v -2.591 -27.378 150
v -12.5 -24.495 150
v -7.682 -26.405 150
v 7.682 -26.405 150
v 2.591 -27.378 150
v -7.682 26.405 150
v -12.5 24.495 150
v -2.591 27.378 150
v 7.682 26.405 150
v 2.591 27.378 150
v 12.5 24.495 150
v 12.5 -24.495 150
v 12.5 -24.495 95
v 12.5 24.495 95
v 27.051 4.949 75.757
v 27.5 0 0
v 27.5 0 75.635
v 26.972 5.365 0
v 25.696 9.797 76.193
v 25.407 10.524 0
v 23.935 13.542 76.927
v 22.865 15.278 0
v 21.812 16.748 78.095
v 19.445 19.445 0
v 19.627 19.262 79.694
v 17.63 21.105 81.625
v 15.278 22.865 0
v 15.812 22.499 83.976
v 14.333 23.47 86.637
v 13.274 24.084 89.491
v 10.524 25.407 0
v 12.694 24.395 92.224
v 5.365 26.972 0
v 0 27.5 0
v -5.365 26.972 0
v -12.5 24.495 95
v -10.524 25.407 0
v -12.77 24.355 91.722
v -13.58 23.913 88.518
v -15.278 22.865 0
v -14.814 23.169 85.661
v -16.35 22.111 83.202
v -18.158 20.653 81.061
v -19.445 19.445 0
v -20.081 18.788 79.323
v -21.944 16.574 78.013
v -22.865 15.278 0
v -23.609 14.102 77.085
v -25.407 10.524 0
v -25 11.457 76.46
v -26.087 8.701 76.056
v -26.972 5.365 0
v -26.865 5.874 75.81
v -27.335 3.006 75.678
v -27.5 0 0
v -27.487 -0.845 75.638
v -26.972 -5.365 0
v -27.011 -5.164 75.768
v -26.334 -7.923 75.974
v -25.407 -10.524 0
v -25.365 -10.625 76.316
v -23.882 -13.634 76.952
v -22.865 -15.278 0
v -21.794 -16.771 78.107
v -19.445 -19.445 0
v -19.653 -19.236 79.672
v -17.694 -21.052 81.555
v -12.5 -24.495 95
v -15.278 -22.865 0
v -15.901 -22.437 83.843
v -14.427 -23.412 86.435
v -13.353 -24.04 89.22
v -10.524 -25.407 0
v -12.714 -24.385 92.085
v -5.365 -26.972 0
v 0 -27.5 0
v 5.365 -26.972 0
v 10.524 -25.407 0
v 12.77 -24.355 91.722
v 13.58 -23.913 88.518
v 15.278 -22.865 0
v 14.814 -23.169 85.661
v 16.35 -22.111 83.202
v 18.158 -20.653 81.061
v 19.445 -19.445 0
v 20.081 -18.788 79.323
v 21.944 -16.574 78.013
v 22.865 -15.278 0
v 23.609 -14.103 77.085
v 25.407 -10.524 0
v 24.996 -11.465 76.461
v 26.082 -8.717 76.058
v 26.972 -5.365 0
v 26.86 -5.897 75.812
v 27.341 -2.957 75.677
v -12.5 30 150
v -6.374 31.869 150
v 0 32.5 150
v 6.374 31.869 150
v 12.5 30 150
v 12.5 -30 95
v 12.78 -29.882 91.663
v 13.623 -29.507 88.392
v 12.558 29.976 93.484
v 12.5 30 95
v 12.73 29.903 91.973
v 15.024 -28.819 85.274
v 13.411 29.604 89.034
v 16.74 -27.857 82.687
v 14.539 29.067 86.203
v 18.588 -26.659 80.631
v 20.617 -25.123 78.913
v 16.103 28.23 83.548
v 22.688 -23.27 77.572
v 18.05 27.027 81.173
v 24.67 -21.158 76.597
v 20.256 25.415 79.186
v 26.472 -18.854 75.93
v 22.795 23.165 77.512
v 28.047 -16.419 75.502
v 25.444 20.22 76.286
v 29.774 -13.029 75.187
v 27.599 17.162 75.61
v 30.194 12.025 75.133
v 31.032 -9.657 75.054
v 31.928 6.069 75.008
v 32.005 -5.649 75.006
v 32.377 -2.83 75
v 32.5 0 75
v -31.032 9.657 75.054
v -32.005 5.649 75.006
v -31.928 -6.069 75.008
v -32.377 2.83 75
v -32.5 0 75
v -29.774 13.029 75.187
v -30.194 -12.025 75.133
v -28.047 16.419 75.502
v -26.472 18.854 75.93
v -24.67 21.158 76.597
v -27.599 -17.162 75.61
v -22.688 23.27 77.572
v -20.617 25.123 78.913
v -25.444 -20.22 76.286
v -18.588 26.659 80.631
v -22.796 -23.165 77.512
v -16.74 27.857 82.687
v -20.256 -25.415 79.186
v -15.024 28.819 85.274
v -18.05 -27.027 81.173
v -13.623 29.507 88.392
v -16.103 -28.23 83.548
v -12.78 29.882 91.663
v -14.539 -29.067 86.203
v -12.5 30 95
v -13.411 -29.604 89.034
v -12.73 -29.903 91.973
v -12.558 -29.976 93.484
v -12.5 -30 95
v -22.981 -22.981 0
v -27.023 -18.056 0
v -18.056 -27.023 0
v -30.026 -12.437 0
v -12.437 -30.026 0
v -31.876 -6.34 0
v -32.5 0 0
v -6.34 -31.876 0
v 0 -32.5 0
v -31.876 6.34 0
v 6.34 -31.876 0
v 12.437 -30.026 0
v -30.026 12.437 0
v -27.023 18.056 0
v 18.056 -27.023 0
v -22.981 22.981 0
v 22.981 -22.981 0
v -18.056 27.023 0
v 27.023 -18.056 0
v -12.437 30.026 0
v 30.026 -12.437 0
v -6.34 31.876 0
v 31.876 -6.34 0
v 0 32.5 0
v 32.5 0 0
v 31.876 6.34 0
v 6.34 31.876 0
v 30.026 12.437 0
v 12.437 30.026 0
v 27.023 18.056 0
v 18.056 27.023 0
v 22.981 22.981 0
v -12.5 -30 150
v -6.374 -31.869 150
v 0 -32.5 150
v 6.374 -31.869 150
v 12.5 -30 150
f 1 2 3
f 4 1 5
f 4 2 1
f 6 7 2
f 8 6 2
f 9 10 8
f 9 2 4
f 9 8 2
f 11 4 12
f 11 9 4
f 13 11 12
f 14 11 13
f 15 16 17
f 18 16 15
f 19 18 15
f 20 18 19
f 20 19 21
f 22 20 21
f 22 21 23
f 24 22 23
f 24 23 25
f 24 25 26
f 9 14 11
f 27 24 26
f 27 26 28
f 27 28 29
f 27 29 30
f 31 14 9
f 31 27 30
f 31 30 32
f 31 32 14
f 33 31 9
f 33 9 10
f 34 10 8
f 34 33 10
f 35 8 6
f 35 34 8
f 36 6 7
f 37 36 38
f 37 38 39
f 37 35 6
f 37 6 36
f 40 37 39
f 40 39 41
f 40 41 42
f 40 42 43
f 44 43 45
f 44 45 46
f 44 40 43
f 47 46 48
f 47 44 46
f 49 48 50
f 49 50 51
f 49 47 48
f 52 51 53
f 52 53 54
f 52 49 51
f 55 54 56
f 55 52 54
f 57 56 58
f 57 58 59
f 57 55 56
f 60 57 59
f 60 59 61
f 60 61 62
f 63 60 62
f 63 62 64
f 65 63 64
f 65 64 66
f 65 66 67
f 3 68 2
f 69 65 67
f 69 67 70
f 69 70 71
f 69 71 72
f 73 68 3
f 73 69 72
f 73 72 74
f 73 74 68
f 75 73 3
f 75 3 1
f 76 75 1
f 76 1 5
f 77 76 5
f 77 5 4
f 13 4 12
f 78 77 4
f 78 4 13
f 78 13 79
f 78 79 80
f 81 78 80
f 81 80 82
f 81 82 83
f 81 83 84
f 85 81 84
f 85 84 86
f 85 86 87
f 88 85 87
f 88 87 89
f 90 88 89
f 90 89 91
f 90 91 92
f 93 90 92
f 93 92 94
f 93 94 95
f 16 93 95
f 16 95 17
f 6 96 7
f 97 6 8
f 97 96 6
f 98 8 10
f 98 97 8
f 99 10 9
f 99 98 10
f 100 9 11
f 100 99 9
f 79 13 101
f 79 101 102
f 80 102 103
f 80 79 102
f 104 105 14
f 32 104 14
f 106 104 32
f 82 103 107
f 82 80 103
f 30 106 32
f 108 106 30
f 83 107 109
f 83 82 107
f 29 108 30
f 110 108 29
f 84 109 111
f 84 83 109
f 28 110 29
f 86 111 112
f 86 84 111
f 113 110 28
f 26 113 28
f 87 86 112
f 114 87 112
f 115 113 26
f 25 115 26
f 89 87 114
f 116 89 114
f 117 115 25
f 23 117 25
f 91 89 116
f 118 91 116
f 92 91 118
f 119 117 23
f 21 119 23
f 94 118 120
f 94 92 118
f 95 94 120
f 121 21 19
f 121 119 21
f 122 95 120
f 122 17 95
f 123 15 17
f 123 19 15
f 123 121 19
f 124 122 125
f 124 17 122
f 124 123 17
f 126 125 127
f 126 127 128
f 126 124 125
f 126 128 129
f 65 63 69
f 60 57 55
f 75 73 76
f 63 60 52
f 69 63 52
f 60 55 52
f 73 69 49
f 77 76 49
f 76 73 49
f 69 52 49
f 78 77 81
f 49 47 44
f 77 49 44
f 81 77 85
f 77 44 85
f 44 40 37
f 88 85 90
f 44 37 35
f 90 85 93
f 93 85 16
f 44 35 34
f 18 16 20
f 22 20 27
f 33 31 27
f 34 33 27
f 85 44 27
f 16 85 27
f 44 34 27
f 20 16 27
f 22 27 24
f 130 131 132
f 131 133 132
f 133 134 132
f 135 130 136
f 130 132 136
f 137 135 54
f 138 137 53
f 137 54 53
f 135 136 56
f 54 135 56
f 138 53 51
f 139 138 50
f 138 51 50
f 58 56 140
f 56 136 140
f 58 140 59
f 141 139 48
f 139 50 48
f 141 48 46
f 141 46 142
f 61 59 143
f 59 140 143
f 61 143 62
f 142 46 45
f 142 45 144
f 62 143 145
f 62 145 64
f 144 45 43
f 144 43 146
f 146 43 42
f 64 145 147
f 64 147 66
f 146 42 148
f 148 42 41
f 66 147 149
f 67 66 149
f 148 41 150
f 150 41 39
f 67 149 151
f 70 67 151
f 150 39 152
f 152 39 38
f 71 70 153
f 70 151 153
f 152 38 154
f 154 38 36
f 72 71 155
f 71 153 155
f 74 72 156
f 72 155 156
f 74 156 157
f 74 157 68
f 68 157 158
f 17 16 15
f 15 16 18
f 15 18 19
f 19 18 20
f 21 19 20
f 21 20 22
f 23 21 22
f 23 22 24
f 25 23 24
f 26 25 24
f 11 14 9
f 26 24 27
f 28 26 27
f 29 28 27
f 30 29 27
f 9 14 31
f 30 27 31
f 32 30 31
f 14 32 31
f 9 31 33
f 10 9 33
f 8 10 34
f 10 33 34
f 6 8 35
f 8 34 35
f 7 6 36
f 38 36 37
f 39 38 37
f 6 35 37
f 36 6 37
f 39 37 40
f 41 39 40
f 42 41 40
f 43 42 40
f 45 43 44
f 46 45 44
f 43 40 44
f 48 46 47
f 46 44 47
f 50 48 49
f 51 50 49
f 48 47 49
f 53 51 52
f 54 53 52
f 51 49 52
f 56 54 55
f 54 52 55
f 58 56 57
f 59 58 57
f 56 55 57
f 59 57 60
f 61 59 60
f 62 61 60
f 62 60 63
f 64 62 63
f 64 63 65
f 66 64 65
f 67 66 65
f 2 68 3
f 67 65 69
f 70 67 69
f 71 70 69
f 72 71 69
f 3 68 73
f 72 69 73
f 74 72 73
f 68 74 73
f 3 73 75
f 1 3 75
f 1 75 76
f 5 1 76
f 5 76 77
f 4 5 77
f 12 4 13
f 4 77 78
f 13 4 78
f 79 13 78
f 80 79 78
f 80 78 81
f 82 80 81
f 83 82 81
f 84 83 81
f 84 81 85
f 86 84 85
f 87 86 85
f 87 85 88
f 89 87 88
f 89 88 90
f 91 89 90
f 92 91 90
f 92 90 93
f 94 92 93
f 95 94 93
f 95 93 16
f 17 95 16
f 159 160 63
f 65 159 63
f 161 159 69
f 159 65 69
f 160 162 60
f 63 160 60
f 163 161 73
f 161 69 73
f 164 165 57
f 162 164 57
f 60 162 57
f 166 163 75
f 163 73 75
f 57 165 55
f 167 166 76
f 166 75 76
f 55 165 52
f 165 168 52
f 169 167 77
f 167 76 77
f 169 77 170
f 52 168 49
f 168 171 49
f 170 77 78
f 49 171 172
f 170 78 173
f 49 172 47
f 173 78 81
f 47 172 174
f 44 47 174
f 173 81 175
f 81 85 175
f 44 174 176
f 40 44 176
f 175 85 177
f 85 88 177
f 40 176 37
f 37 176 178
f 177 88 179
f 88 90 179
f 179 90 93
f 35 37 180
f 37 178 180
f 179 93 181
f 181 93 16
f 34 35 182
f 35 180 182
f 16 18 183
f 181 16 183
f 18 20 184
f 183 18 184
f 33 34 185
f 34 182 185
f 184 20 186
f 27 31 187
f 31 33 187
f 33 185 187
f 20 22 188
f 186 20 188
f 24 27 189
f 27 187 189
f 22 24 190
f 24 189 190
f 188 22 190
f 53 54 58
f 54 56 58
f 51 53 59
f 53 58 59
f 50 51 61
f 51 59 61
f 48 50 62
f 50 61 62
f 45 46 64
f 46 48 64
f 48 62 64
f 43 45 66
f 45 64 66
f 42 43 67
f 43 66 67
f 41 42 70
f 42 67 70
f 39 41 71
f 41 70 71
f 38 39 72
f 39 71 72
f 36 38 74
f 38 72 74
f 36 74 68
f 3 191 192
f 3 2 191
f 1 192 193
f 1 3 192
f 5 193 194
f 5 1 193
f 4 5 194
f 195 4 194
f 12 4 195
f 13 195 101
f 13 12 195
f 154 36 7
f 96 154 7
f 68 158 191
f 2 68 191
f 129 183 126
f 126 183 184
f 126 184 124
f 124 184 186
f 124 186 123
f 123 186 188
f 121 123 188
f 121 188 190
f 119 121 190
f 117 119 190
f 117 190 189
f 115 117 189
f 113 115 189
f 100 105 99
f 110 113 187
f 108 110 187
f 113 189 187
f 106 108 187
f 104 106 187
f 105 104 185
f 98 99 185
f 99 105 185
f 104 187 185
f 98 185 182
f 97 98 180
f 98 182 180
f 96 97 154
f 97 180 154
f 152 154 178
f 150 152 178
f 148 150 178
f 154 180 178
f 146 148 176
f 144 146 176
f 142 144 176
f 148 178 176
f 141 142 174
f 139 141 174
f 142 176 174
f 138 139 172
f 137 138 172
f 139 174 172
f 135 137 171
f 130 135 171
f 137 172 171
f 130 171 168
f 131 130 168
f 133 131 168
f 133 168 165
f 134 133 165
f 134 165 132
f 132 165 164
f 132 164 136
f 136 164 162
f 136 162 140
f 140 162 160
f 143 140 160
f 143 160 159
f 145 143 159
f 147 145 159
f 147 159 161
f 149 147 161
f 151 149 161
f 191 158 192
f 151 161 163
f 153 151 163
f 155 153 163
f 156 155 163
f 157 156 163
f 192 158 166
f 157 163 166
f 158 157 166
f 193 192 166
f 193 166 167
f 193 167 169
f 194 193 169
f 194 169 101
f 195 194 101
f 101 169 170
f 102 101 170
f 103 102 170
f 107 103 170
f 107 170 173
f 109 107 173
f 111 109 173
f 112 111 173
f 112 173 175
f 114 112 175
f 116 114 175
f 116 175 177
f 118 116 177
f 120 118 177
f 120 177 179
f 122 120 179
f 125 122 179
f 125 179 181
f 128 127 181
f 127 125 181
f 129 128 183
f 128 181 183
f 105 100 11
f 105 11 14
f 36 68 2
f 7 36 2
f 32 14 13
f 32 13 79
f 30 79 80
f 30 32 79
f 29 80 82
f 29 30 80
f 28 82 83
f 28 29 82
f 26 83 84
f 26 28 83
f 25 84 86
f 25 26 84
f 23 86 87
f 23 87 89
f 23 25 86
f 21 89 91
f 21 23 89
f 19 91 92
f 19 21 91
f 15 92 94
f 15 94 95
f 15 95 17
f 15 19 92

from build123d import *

# Parameters (mm, degrees)
F0_R     = 27.5
F1_DEPTH = 150
F0_R_2   = 32.5
F2_DEPTH = 150
F4_DEPTH = 50


with BuildPart() as f1:
    # F0 (on Top) → F1 (new body)
    with BuildSketch(Plane.XY):
        Circle(F0_R)
    extrude(amount=F1_DEPTH)


with BuildPart() as f2:
    # F0 (on Top) → F2 (new body)
    with BuildSketch(Plane.XY):
        Circle(F0_R_2)
        Circle(F0_R, mode=Mode.SUBTRACT)
    extrude(amount=F2_DEPTH)


with BuildPart() as f4_tool:
    # F3 (on Front) → F4 (new body, symmetric)
    with BuildSketch(Plane.XZ):
        with BuildLine():
            Line((55.4596690089, 75), (55.4596690089, 165))
            Line((55.4596690089, 165), (12.5, 165))
            Line((12.5, 165), (12.5, 95))
            ThreePointArc((12.5, 95), (18.3578643763, 80.8578643763), (32.5, 75))
            Line((32.5, 75), (55.4596690089, 75))
        make_face()
        with BuildLine():
            Line((-12.5, 165), (-55.4596690089, 165))
            Line((-55.4596690089, 165), (-55.4596690089, 75))
            Line((-55.4596690089, 75), (-32.5, 75))
            ThreePointArc((-32.5, 75), (-18.3578643763, 80.8578643763), (-12.5, 95))
            Line((-12.5, 95), (-12.5, 165))
        make_face()
    extrude(amount=F4_DEPTH, both=True)


with BuildPart() as f1_1:
    add(f1.part)

    # F4: cut by f4_tool
    add(f4_tool.part, mode=Mode.SUBTRACT)


with BuildPart() as f2_1:
    add(f2.part)

    # F4: cut by f4_tool
    add(f4_tool.part, mode=Mode.SUBTRACT)


solid = Compound([f1_1.part, f2_1.part])
